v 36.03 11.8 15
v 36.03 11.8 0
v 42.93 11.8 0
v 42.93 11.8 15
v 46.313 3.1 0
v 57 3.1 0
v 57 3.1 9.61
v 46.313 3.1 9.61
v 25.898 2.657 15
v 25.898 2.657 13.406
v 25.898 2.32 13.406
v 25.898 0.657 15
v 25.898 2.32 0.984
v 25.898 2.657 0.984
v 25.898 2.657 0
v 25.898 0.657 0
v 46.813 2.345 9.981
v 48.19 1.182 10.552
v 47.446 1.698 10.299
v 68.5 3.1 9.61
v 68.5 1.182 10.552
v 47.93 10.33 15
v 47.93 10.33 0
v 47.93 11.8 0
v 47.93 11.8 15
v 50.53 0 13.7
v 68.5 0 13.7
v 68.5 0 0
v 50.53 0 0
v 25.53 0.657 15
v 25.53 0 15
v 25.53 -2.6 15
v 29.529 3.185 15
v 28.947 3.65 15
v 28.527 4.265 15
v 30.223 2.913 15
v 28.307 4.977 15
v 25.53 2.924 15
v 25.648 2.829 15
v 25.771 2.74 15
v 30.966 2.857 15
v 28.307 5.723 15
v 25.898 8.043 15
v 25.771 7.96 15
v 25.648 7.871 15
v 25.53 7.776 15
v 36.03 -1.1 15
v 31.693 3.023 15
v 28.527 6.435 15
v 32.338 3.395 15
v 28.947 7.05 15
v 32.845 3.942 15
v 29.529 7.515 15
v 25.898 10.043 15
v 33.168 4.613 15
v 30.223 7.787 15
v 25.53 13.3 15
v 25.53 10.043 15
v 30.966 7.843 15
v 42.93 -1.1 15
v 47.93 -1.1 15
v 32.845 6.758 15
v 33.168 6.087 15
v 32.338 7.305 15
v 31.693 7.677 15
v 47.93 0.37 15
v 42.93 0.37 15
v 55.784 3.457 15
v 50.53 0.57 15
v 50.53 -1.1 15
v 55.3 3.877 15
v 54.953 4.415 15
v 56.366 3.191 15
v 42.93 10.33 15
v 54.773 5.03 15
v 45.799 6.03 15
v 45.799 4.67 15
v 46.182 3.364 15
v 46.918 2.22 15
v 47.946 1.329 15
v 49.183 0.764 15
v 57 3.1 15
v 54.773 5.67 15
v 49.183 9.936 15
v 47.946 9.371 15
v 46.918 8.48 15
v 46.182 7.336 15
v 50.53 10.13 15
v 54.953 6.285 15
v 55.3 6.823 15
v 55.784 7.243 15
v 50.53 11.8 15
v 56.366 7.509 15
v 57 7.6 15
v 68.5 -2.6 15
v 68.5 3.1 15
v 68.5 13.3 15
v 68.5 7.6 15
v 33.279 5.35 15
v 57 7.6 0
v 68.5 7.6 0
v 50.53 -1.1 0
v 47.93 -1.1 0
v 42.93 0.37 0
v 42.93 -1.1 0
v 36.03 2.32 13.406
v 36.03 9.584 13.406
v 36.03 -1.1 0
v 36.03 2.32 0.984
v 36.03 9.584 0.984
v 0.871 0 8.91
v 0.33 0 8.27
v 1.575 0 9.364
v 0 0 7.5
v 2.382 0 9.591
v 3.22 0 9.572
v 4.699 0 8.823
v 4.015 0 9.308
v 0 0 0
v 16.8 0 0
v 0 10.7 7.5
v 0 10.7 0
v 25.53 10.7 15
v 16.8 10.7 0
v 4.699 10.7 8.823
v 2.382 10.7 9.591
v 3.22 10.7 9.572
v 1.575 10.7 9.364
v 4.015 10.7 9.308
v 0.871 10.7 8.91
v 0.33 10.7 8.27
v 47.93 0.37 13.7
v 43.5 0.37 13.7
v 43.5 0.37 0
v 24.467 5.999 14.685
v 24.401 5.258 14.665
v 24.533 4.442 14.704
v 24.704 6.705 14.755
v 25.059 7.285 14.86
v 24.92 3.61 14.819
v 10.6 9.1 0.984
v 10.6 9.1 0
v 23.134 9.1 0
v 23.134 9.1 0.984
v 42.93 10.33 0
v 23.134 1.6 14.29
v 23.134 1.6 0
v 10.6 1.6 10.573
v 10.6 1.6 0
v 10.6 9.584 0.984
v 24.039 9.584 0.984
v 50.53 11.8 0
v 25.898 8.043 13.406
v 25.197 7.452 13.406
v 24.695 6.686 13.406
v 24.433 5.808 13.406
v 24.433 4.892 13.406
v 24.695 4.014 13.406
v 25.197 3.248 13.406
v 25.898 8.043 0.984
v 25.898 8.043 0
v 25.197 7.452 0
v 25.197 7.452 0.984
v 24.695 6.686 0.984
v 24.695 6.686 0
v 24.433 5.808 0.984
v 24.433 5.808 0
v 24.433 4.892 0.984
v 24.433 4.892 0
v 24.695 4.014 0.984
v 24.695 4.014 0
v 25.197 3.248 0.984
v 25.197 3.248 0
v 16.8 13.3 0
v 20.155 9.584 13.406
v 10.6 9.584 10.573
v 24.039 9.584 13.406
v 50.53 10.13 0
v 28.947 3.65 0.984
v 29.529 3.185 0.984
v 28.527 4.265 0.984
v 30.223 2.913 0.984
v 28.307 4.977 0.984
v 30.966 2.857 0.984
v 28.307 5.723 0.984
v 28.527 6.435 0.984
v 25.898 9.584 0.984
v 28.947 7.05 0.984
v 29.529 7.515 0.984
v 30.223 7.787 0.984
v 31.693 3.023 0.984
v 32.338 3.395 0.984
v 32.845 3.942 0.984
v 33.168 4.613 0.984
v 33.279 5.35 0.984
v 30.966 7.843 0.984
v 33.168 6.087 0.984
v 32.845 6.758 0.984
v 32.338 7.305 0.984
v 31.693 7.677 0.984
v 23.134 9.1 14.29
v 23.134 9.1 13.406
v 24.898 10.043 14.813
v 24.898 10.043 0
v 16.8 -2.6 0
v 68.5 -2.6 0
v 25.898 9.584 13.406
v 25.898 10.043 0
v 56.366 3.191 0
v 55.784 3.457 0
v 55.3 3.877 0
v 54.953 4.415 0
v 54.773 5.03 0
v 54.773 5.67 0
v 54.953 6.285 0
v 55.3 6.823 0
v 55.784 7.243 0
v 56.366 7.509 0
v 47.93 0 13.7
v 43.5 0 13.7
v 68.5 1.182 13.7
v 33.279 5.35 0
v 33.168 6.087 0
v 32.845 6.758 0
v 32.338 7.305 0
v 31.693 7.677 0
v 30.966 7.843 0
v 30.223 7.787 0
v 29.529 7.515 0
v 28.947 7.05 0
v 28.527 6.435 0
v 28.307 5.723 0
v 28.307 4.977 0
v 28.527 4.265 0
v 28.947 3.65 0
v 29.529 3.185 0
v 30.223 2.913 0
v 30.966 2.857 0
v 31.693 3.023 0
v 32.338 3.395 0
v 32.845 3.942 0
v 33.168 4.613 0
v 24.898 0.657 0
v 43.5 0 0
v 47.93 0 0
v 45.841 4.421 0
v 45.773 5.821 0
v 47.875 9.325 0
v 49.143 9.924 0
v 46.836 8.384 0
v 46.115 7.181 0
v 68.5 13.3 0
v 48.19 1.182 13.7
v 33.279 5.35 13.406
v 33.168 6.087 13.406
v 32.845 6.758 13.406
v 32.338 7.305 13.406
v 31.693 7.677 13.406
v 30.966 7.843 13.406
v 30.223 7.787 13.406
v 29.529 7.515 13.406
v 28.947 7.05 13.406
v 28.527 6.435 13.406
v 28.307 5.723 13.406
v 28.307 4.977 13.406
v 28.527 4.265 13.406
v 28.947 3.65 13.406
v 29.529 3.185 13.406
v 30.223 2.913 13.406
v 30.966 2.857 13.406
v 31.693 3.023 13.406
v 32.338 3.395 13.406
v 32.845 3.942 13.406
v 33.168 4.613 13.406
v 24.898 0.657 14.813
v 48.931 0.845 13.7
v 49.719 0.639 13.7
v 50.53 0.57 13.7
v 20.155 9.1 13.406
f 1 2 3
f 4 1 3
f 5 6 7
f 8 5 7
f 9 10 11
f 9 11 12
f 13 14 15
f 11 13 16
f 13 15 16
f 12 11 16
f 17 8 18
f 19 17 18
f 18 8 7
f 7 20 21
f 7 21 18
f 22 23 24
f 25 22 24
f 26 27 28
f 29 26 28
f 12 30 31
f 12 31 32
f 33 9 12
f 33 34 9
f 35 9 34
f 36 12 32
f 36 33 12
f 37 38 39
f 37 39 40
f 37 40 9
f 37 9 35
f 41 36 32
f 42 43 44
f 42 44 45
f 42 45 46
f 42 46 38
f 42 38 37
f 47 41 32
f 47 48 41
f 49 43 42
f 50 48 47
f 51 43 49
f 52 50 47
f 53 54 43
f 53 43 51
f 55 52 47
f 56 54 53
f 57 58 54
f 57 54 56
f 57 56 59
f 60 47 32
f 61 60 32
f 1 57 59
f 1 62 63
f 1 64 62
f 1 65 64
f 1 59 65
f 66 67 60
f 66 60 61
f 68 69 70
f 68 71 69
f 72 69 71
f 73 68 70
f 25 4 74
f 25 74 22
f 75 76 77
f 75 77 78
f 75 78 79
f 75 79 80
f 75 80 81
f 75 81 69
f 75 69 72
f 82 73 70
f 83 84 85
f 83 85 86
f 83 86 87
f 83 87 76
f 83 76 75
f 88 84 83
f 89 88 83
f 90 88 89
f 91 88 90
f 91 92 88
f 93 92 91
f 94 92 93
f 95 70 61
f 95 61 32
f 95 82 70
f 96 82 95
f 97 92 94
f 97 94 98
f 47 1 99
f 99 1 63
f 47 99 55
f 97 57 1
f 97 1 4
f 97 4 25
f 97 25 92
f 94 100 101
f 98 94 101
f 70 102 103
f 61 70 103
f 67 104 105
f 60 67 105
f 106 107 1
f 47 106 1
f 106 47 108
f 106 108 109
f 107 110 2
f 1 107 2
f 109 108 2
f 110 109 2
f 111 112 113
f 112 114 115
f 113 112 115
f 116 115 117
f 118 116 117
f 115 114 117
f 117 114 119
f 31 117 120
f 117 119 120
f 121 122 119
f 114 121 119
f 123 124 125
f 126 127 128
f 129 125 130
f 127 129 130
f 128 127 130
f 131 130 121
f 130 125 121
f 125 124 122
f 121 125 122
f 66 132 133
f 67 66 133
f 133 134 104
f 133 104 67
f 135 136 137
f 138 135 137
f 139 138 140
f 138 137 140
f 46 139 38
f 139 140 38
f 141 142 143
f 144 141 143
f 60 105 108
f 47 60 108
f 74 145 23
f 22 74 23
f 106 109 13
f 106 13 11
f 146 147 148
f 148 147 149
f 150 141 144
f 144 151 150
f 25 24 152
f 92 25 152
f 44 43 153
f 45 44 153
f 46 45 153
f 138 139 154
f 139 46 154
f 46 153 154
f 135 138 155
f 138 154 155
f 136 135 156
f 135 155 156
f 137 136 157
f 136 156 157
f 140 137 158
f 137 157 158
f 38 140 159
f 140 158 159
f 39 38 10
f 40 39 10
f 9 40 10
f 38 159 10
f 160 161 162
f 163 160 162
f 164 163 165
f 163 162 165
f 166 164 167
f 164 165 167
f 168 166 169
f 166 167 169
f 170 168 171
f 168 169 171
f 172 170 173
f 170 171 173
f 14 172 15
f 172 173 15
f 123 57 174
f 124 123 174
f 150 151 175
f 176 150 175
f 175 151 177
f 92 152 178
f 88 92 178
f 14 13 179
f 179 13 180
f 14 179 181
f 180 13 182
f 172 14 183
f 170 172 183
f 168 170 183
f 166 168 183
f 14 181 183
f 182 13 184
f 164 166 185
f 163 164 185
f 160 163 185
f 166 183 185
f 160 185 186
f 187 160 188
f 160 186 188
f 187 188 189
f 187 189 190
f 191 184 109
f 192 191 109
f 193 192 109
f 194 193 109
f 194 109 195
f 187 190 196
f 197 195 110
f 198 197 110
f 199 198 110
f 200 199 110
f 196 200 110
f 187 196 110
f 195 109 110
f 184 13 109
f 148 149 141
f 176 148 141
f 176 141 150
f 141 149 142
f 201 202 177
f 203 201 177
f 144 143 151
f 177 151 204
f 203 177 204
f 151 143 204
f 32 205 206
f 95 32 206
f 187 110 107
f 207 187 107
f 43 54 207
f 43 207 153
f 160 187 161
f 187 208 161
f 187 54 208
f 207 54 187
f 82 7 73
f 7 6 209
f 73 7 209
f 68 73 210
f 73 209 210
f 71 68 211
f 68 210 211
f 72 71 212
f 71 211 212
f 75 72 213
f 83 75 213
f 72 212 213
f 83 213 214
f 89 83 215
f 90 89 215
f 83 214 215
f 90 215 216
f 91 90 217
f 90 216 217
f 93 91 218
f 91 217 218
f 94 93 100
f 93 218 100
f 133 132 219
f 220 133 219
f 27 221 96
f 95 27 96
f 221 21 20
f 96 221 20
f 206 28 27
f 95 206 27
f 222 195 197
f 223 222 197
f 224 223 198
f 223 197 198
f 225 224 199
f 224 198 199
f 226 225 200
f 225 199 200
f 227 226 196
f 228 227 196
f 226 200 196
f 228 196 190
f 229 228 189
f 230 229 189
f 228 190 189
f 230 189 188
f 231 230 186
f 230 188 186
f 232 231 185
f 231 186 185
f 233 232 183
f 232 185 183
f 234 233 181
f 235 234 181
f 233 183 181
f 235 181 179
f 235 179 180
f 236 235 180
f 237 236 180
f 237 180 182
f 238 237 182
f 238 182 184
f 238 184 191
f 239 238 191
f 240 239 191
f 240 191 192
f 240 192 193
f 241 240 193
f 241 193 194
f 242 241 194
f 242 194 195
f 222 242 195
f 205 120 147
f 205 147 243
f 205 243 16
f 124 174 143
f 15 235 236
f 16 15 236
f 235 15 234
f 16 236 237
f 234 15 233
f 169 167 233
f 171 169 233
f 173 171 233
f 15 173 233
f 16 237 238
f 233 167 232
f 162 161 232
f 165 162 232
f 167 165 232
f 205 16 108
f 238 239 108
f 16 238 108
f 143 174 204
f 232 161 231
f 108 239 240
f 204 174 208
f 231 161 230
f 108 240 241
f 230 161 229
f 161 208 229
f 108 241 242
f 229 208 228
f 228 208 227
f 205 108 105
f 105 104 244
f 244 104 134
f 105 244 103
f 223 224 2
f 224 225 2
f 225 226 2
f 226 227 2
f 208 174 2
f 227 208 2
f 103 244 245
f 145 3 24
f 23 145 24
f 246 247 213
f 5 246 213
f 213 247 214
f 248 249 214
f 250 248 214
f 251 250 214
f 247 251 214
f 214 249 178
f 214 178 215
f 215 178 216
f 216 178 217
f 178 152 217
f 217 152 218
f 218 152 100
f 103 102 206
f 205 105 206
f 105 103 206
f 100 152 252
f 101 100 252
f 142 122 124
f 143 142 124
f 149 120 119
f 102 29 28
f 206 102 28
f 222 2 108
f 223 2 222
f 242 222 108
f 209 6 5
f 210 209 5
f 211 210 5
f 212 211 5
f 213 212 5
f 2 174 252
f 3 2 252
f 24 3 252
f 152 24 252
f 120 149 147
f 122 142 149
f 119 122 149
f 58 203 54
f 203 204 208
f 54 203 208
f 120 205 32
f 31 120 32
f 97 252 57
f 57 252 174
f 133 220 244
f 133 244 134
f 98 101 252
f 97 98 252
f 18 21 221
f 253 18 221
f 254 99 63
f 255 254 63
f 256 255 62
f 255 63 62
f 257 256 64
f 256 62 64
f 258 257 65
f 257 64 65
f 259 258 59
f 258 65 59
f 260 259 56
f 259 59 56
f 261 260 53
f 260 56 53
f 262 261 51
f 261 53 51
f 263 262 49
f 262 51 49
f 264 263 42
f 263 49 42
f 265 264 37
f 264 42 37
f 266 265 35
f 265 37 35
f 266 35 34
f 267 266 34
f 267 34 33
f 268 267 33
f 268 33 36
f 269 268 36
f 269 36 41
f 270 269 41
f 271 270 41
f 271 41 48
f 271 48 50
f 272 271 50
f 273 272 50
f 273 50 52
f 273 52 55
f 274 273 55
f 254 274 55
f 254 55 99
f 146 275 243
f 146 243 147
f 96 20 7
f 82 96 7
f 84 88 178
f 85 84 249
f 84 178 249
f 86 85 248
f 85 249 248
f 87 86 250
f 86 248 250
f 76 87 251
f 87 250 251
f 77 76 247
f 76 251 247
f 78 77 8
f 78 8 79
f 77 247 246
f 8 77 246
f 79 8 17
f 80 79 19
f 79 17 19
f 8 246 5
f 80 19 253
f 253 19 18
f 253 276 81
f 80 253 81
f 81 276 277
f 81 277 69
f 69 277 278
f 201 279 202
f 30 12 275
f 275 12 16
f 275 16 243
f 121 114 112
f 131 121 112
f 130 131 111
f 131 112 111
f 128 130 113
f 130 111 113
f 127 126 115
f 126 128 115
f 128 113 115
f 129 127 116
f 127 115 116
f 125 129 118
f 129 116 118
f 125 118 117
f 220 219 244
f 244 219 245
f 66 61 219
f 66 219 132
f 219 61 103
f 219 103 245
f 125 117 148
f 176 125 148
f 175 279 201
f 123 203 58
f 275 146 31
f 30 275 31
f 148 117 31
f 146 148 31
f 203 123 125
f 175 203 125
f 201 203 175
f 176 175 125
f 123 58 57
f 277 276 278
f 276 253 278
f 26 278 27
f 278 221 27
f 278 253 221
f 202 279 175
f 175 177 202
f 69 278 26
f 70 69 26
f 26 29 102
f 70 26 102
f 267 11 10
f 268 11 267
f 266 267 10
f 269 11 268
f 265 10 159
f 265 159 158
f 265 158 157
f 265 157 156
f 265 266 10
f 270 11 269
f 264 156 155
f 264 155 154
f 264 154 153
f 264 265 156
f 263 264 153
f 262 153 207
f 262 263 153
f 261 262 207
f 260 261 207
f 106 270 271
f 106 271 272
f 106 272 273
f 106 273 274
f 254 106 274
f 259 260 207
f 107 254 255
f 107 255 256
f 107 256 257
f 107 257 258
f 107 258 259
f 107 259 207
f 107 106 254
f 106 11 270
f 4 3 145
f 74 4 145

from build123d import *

# Parameters (mm, degrees)
F1_DEPTH  = 15
F3_DEPTH  = 2.6
F5_DEPTH  = 2.6
F6_R      = 2.5
F7_DEPTH  = 15.001
F9_DEPTH  = 25
F10_W     = 7.263658
F10_H     = 12.422406
F11_DEPTH = 25.43
F13_DEPTH = 13.301


with BuildPart() as f1:
    # F0 (on Top) → F1 (new body)
    with BuildSketch(Plane.XY):
        with BuildLine():
            Line((0, 10.7), (0, 0))
            Line((0, 0), (16.8, 0))
            Line((16.8, 0), (16.8, -2.6))
            Line((16.8, -2.6), (68.5, -2.6))
            Line((68.5, -2.6), (68.5, 3.1))
            Line((68.5, 3.1), (57, 3.1))
            ThreePointArc((57, 3.1), (54.75, 5.35), (57, 7.6))
            Line((57, 7.6), (68.5, 7.6))
            Line((68.5, 7.6), (68.5, 13.3))
            Line((68.5, 13.3), (16.8, 13.3))
            Line((16.8, 13.3), (16.8, 10.7))
            Line((16.8, 10.7), (0, 10.7))
        make_face()
        with BuildLine():
            Line((50.53, 0.57), (50.53, -1.1))
            Line((50.53, -1.1), (47.93, -1.1))
            Line((47.93, -1.1), (47.93, 0.37))
            Line((47.93, 0.37), (42.93, 0.37))
            Line((42.93, 0.37), (42.93, -1.1))
            Line((42.93, -1.1), (36.03, -1.1))
            Line((36.03, -1.1), (36.03, 11.8))
            Line((36.03, 11.8), (42.93, 11.8))
            Line((42.93, 11.8), (42.93, 10.33))
            Line((42.93, 10.33), (47.93, 10.33))
            Line((47.93, 10.33), (47.93, 11.8))
            Line((47.93, 11.8), (50.53, 11.8))
            Line((50.53, 11.8), (50.53, 10.13))
            ThreePointArc((50.53, 10.13), (45.75, 5.35), (50.53, 0.57))
        make_face(mode=Mode.SUBTRACT)
        with BuildLine():
            Line((25.897848, 2.656896), (25.897848, 0.656896))
            Line((25.897848, 0.656896), (24.897848, 0.656896))
            Line((24.897848, 0.656896), (23.134171, 1.6))
            Line((23.134171, 1.6), (10.6, 1.6))
            Line((10.6, 1.6), (10.6, 9.1))
            Line((10.6, 9.1), (23.134171, 9.1))
            Line((23.134171, 9.1), (24.897848, 10.043104))
            Line((24.897848, 10.043104), (25.897848, 10.043104))
            Line((25.897848, 10.043104), (25.897848, 8.043104))
            ThreePointArc((25.897848, 8.043104), (24.4, 5.35), (25.897848, 2.656896))
        make_face(mode=Mode.SUBTRACT)
    extrude(amount=F1_DEPTH)

    # F2 (on face) → F3 (cut, through all)
    with BuildSketch(Plane.XZ.offset(2.6)):
        Polygon((16.8, 15), (16.8, 0), (25.530007, 15), align=None)
    extrude(amount=-F3_DEPTH, mode=Mode.SUBTRACT)

    # F4 (on face) → F5 (cut, through all)
    with BuildSketch(Plane(origin=(0, 13.3, 0), x_dir=(-1, 0, 0), z_dir=(0, 1, 0))):
        Polygon((-25.53, 15), (-16.8, 0), (-16.8, 15), align=None)
    extrude(amount=-F5_DEPTH, mode=Mode.SUBTRACT)

    # F6 (on face) → F7 (cut, through all)
    with BuildSketch(Plane.XY.offset(15)):
        with Locations((30.779256, 5.35)):
            Circle(F6_R)
    extrude(amount=-F7_DEPTH, mode=Mode.SUBTRACT)

    # F8 (on face) → F9 (cut)
    with BuildSketch(Plane.YZ.offset(68.5)):
        Polygon((0, 13.7), (0, 0), (3.1, 0), (3.1, 9.610246), (1.181896, 10.552361), (1.181896, 13.7), align=None)
    extrude(amount=-F9_DEPTH, mode=Mode.SUBTRACT)

    # F10 (on face) → F11 (cut, through all)
    with BuildSketch(Plane.YZ.offset(36.03)):
        with Locations((5.951841, 7.195009)):
            Rectangle(F10_W, F10_H)
    extrude(amount=-F11_DEPTH, mode=Mode.SUBTRACT)

    # F12 (on face) → F13 (cut, through all)
    with BuildSketch(Plane.XZ):
        with BuildLine():
            ThreePointArc((0, 7.5), (1.970314, 9.507508), (4.698562, 8.822753))
            Line((4.698562, 8.822753), (25.530007, 15))
            Line((25.530007, 15), (0, 15))
            Line((0, 15), (0, 7.5))
        make_face()
    extrude(amount=-F13_DEPTH, mode=Mode.SUBTRACT)


solid = f1.part
